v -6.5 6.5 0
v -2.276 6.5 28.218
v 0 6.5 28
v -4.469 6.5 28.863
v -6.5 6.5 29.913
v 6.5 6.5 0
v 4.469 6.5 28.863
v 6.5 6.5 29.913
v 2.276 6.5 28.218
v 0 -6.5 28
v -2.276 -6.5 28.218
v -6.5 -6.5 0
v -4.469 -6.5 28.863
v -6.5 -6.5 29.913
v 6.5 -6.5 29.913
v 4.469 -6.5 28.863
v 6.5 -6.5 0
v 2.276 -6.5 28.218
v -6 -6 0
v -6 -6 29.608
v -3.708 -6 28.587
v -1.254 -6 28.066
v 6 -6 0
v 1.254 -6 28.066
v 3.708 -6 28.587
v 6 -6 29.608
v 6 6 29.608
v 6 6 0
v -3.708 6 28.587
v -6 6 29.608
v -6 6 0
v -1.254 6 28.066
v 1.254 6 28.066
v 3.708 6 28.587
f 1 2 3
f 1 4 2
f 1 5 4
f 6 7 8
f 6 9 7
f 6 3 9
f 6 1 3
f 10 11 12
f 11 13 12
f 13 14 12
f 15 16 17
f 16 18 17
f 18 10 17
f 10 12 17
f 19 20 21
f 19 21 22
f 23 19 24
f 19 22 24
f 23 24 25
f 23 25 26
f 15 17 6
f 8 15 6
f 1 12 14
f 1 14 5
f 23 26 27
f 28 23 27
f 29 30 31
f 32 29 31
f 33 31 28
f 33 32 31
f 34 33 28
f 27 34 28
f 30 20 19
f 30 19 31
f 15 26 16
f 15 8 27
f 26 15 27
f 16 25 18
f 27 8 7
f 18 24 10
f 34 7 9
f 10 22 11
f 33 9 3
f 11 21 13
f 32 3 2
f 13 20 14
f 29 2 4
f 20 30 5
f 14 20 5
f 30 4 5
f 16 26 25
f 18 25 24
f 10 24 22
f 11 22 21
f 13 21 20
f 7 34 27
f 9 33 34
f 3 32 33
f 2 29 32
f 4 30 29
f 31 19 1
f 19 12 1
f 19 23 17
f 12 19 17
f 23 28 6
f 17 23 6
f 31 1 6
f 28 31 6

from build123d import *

# Parameters (mm, degrees)
CROQUIS1_W              = 13
CROQUIS1_H              = 13
SALIENTE_EXTRUIR1_DEPTH = 40
CORTAR_EXTRUIR1_REACH   = 43.043
CROQUIS2_W              = 12
CROQUIS2_H              = 12
CROQUIS4_R              = 12
CORTAR_EXTRUIR3_DEPTH   = 26


with BuildPart() as part:
    # Croquis1 → Saliente-Extruir1 (new body)
    with BuildSketch(Plane.XY):
        Rectangle(CROQUIS1_W, CROQUIS1_H)
    extrude(amount=SALIENTE_EXTRUIR1_DEPTH)

    # Croquis2 → Cortar-Extruir1 (cut, up to next)
    with BuildSketch(Plane.XY.offset(40), mode=Mode.PRIVATE) as cortar_extruir1_sk1:
        Rectangle(CROQUIS2_W, CROQUIS2_H)
    cortar_extruir1_tool1 = extrude(cortar_extruir1_sk1.sketch, amount=-CORTAR_EXTRUIR1_REACH, mode=Mode.PRIVATE) & part.part
    add(cortar_extruir1_tool1.solids().sort_by_distance((0, 0, 40))[0], mode=Mode.SUBTRACT)

    # Croquis4 → Cortar-Extruir3 (cut)
    with BuildSketch(Plane(origin=(0, 6.5, 0), x_dir=(1, 0, 0), z_dir=(0, 1, 0))):
        with Locations((0, -40)):
            Circle(CROQUIS4_R)
    extrude(amount=-CORTAR_EXTRUIR3_DEPTH, mode=Mode.SUBTRACT)


solid = part.part
